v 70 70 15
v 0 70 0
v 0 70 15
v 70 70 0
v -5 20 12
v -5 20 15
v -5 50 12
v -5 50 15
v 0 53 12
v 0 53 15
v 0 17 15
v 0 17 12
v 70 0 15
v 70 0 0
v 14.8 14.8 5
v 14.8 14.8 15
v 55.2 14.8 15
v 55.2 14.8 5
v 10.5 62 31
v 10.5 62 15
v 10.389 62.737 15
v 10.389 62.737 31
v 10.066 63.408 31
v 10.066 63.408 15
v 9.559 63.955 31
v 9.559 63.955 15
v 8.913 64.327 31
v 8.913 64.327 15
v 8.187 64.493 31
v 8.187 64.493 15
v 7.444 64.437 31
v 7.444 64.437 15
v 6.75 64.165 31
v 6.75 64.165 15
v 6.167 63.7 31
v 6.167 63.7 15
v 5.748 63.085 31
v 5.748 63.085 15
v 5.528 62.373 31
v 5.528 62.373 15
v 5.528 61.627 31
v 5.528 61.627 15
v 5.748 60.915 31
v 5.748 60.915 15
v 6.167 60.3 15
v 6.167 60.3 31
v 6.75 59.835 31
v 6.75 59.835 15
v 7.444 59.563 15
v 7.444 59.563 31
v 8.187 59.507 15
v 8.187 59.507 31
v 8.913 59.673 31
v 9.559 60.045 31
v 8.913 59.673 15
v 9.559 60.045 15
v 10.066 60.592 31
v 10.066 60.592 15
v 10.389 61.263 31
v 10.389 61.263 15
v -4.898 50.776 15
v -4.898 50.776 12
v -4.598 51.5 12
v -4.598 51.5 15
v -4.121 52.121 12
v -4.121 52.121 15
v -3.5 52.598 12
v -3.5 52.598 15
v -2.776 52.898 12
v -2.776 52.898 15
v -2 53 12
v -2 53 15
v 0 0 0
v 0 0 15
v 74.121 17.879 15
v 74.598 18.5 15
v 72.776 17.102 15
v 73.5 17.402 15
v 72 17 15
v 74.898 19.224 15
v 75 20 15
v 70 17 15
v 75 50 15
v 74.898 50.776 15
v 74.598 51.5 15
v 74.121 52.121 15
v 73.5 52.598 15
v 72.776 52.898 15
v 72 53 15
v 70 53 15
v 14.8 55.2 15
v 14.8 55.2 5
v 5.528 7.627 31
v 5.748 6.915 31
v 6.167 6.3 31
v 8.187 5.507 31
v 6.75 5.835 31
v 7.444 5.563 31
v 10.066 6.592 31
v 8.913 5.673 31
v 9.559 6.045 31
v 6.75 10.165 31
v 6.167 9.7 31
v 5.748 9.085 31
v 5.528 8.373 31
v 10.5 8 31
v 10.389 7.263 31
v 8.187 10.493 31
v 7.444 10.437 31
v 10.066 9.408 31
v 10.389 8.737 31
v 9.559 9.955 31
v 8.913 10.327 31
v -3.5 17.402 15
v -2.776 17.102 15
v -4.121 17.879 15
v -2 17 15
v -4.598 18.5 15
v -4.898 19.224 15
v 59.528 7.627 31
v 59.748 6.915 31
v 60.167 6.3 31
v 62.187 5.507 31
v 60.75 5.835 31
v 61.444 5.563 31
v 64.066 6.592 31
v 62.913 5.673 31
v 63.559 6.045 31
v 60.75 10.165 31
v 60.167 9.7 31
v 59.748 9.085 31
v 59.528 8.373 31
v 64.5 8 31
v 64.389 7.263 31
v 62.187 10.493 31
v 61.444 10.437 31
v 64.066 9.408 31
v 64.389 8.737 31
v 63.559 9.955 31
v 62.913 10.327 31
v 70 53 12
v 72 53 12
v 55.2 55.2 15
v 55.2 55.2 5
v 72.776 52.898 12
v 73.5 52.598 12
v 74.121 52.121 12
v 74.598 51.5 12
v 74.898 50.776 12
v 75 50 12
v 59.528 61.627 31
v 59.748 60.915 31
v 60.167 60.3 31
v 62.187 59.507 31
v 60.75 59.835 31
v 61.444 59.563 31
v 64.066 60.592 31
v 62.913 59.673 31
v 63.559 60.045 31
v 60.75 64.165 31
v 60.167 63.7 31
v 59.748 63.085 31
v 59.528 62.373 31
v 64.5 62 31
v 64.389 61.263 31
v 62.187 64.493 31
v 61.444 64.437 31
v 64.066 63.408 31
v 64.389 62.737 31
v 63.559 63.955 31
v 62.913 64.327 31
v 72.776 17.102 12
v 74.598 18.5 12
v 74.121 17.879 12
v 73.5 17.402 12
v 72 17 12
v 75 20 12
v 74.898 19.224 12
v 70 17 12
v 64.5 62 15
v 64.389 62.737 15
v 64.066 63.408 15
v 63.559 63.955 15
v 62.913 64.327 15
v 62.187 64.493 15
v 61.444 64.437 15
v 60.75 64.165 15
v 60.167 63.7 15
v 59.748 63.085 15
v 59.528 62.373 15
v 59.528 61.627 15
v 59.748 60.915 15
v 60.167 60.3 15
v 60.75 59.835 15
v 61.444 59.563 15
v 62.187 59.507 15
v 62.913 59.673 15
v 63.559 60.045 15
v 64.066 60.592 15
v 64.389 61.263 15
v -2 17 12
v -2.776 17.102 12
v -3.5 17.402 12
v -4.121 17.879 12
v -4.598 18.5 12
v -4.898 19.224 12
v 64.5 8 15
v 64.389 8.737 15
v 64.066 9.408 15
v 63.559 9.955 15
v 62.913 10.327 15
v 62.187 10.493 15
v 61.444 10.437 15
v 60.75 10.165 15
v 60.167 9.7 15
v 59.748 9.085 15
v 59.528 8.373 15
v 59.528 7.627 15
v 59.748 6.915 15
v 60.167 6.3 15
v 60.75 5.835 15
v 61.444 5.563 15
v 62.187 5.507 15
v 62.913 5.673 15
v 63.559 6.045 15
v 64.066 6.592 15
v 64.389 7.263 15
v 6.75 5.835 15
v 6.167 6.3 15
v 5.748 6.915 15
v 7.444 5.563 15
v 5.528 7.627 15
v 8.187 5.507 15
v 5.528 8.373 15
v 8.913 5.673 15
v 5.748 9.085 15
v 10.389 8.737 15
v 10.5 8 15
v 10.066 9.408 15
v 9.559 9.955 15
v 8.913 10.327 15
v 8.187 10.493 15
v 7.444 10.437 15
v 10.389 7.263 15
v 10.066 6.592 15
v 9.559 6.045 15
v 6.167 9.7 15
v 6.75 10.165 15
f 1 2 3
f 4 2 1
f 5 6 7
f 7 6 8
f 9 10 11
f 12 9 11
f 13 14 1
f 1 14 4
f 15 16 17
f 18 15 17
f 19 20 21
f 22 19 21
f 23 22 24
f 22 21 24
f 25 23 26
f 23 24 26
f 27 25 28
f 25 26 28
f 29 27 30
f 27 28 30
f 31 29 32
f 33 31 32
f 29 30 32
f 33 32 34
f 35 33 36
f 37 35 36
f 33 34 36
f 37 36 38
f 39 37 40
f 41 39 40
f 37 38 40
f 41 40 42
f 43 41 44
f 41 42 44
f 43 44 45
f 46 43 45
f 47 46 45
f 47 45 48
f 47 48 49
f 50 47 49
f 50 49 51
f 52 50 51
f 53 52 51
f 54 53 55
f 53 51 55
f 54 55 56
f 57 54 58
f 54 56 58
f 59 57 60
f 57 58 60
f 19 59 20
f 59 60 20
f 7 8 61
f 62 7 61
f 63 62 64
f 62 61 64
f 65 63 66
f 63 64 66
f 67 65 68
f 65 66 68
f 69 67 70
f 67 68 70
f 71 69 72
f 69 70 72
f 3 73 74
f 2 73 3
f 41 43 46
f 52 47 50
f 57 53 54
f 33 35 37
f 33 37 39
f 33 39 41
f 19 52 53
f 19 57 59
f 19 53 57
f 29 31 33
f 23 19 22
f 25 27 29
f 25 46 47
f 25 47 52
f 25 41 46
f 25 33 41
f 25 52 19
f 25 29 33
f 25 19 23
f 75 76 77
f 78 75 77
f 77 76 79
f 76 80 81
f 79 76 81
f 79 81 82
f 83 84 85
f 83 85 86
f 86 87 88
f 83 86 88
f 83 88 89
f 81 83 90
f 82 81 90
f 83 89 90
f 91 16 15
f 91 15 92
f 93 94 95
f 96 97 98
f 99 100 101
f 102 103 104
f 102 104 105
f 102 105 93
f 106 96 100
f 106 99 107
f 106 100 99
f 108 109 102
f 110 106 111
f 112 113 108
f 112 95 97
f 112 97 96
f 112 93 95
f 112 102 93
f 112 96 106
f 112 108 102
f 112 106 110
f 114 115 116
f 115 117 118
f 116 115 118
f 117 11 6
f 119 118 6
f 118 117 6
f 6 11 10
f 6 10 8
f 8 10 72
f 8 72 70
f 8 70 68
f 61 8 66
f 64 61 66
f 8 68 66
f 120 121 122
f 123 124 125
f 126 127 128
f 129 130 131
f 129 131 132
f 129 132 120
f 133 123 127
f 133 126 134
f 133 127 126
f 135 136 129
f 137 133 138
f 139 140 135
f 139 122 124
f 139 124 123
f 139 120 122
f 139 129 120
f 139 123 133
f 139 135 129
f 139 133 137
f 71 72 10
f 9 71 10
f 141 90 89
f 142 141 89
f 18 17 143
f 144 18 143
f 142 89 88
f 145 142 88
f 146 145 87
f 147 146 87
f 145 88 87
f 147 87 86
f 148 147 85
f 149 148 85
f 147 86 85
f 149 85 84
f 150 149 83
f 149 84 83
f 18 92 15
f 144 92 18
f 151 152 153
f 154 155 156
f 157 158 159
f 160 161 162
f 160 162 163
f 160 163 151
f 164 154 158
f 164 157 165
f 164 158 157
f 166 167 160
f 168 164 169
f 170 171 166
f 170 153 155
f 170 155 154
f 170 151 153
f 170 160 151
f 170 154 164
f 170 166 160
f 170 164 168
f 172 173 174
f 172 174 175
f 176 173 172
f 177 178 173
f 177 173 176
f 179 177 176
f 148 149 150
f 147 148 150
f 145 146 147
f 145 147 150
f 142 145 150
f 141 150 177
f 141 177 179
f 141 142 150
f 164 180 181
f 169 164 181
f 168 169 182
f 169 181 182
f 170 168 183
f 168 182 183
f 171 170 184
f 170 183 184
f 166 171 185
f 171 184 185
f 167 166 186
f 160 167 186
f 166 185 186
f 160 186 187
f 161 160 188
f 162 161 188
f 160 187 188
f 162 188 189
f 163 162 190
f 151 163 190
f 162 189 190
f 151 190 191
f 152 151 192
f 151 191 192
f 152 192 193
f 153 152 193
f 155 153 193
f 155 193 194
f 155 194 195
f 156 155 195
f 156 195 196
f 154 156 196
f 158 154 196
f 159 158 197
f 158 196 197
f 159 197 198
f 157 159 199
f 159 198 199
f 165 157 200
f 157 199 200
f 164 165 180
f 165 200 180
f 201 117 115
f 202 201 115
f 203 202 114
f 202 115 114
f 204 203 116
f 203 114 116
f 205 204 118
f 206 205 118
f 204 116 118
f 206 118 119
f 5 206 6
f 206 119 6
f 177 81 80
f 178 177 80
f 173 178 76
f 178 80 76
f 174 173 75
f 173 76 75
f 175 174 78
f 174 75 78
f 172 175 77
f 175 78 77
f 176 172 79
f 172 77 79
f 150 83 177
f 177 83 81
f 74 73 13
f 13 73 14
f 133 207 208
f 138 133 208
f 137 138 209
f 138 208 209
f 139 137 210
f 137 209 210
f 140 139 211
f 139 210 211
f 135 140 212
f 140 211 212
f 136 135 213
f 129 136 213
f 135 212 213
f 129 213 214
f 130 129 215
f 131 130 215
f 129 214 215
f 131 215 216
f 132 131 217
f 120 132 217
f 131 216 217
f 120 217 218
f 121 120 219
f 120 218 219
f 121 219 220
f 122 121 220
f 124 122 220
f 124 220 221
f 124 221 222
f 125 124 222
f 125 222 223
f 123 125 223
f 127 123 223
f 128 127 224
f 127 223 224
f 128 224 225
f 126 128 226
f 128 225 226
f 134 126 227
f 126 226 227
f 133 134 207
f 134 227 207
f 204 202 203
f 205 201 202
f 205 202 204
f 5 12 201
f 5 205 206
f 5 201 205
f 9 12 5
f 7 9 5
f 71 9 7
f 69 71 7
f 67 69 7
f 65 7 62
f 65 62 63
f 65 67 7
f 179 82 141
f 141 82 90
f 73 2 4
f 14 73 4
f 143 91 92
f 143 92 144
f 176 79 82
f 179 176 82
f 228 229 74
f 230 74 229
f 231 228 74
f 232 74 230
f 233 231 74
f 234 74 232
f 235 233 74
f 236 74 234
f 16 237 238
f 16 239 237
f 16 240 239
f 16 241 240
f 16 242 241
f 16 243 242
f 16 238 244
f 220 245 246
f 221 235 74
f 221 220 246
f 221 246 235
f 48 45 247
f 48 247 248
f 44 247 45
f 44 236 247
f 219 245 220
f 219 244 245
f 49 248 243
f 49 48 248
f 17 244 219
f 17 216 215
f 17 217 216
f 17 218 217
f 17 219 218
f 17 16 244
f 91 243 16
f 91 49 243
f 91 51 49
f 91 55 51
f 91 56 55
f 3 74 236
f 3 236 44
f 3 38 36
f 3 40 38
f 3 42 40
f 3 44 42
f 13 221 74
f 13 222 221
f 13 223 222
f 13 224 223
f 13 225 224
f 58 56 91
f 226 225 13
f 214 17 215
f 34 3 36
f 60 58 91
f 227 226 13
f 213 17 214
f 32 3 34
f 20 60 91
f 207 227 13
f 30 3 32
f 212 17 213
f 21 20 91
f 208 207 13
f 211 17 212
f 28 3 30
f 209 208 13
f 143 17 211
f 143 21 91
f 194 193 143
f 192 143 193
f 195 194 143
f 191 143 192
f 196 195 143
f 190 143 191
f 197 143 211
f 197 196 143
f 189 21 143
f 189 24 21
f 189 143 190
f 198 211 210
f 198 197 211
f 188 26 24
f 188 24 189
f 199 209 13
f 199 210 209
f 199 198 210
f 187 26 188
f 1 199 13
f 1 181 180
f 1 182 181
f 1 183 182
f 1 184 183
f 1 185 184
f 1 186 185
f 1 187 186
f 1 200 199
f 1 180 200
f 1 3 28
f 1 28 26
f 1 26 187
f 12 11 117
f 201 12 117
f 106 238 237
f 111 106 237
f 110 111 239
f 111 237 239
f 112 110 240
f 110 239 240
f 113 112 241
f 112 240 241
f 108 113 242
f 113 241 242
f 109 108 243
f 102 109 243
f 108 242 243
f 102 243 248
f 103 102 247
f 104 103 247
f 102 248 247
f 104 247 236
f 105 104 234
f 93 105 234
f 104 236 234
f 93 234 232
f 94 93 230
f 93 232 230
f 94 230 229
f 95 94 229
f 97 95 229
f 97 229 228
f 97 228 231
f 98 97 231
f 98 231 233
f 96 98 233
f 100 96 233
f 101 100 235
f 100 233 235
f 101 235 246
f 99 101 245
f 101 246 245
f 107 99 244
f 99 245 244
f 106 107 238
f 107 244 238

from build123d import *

# Parameters (mm, degrees)
SKETCH_1_W          = 70
SKETCH_1_H          = 70
EXTRUDE_1_DEPTH     = 15
SKETCH_2_W          = 40.4
SKETCH_2_H          = 40.4
CUT_EXTRUDE_1_DEPTH = 10
SKETCH_3_R          = 2.5
EXTRUDE_2_DEPTH     = 16
EXTRUDE_3_DEPTH     = 3
EXTRUDE_3_2_DEPTH   = 3


with BuildPart() as part:
    # 草图1 → 凸台-拉伸1 (new body)
    with BuildSketch(Plane.XY):
        with Locations((35, 35)):
            Rectangle(SKETCH_1_W, SKETCH_1_H)
    extrude(amount=EXTRUDE_1_DEPTH)

    # 草图2 → 切除-拉伸1 (cut)
    with BuildSketch(Plane.XY.offset(15)):
        with Locations((35, 35)):
            Rectangle(SKETCH_2_W, SKETCH_2_H)
    extrude(amount=-CUT_EXTRUDE_1_DEPTH, mode=Mode.SUBTRACT)

    # 草图3 → 凸台-拉伸2 (add)
    with BuildSketch(Plane.XY.offset(15)):
        with Locations((8, 62)):
            Circle(SKETCH_3_R)
        with Locations((62, 62)):
            Circle(SKETCH_3_R)
        with Locations((62, 8)):
            Circle(SKETCH_3_R)
        with Locations((8, 8)):
            Circle(SKETCH_3_R)
    extrude(amount=EXTRUDE_2_DEPTH)


with BuildPart() as body_2:
    # 草图5 → 凸台-拉伸3 (new body)
    with BuildSketch(Plane.XY.offset(15)):
        with BuildLine():
            Line((-2, 53), (0, 53))
            Line((0, 53), (0, 17))
            Line((0, 17), (-2, 17))
            ThreePointArc((-2, 17), (-4.121320344, 17.878679656), (-5, 20))
            Line((-5, 20), (-5, 50))
            ThreePointArc((-5, 50), (-4.121320344, 52.121320344), (-2, 53))
        make_face()
    extrude(amount=-EXTRUDE_3_DEPTH)


with BuildPart() as body_3:
    # 草图5 → Extrude 3 2 (new body)
    with BuildSketch(Plane.XY.offset(15)):
        with BuildLine():
            Line((72, 17), (70, 17))
            Line((70, 17), (70, 53))
            Line((70, 53), (72, 53))
            ThreePointArc((72, 53), (74.121320344, 52.121320344), (75, 50))
            Line((75, 50), (75, 20))
            ThreePointArc((75, 20), (74.121320344, 17.878679656), (72, 17))
        make_face()
    extrude(amount=-EXTRUDE_3_2_DEPTH)


solid = Compound([part.part, body_2.part, body_3.part])
